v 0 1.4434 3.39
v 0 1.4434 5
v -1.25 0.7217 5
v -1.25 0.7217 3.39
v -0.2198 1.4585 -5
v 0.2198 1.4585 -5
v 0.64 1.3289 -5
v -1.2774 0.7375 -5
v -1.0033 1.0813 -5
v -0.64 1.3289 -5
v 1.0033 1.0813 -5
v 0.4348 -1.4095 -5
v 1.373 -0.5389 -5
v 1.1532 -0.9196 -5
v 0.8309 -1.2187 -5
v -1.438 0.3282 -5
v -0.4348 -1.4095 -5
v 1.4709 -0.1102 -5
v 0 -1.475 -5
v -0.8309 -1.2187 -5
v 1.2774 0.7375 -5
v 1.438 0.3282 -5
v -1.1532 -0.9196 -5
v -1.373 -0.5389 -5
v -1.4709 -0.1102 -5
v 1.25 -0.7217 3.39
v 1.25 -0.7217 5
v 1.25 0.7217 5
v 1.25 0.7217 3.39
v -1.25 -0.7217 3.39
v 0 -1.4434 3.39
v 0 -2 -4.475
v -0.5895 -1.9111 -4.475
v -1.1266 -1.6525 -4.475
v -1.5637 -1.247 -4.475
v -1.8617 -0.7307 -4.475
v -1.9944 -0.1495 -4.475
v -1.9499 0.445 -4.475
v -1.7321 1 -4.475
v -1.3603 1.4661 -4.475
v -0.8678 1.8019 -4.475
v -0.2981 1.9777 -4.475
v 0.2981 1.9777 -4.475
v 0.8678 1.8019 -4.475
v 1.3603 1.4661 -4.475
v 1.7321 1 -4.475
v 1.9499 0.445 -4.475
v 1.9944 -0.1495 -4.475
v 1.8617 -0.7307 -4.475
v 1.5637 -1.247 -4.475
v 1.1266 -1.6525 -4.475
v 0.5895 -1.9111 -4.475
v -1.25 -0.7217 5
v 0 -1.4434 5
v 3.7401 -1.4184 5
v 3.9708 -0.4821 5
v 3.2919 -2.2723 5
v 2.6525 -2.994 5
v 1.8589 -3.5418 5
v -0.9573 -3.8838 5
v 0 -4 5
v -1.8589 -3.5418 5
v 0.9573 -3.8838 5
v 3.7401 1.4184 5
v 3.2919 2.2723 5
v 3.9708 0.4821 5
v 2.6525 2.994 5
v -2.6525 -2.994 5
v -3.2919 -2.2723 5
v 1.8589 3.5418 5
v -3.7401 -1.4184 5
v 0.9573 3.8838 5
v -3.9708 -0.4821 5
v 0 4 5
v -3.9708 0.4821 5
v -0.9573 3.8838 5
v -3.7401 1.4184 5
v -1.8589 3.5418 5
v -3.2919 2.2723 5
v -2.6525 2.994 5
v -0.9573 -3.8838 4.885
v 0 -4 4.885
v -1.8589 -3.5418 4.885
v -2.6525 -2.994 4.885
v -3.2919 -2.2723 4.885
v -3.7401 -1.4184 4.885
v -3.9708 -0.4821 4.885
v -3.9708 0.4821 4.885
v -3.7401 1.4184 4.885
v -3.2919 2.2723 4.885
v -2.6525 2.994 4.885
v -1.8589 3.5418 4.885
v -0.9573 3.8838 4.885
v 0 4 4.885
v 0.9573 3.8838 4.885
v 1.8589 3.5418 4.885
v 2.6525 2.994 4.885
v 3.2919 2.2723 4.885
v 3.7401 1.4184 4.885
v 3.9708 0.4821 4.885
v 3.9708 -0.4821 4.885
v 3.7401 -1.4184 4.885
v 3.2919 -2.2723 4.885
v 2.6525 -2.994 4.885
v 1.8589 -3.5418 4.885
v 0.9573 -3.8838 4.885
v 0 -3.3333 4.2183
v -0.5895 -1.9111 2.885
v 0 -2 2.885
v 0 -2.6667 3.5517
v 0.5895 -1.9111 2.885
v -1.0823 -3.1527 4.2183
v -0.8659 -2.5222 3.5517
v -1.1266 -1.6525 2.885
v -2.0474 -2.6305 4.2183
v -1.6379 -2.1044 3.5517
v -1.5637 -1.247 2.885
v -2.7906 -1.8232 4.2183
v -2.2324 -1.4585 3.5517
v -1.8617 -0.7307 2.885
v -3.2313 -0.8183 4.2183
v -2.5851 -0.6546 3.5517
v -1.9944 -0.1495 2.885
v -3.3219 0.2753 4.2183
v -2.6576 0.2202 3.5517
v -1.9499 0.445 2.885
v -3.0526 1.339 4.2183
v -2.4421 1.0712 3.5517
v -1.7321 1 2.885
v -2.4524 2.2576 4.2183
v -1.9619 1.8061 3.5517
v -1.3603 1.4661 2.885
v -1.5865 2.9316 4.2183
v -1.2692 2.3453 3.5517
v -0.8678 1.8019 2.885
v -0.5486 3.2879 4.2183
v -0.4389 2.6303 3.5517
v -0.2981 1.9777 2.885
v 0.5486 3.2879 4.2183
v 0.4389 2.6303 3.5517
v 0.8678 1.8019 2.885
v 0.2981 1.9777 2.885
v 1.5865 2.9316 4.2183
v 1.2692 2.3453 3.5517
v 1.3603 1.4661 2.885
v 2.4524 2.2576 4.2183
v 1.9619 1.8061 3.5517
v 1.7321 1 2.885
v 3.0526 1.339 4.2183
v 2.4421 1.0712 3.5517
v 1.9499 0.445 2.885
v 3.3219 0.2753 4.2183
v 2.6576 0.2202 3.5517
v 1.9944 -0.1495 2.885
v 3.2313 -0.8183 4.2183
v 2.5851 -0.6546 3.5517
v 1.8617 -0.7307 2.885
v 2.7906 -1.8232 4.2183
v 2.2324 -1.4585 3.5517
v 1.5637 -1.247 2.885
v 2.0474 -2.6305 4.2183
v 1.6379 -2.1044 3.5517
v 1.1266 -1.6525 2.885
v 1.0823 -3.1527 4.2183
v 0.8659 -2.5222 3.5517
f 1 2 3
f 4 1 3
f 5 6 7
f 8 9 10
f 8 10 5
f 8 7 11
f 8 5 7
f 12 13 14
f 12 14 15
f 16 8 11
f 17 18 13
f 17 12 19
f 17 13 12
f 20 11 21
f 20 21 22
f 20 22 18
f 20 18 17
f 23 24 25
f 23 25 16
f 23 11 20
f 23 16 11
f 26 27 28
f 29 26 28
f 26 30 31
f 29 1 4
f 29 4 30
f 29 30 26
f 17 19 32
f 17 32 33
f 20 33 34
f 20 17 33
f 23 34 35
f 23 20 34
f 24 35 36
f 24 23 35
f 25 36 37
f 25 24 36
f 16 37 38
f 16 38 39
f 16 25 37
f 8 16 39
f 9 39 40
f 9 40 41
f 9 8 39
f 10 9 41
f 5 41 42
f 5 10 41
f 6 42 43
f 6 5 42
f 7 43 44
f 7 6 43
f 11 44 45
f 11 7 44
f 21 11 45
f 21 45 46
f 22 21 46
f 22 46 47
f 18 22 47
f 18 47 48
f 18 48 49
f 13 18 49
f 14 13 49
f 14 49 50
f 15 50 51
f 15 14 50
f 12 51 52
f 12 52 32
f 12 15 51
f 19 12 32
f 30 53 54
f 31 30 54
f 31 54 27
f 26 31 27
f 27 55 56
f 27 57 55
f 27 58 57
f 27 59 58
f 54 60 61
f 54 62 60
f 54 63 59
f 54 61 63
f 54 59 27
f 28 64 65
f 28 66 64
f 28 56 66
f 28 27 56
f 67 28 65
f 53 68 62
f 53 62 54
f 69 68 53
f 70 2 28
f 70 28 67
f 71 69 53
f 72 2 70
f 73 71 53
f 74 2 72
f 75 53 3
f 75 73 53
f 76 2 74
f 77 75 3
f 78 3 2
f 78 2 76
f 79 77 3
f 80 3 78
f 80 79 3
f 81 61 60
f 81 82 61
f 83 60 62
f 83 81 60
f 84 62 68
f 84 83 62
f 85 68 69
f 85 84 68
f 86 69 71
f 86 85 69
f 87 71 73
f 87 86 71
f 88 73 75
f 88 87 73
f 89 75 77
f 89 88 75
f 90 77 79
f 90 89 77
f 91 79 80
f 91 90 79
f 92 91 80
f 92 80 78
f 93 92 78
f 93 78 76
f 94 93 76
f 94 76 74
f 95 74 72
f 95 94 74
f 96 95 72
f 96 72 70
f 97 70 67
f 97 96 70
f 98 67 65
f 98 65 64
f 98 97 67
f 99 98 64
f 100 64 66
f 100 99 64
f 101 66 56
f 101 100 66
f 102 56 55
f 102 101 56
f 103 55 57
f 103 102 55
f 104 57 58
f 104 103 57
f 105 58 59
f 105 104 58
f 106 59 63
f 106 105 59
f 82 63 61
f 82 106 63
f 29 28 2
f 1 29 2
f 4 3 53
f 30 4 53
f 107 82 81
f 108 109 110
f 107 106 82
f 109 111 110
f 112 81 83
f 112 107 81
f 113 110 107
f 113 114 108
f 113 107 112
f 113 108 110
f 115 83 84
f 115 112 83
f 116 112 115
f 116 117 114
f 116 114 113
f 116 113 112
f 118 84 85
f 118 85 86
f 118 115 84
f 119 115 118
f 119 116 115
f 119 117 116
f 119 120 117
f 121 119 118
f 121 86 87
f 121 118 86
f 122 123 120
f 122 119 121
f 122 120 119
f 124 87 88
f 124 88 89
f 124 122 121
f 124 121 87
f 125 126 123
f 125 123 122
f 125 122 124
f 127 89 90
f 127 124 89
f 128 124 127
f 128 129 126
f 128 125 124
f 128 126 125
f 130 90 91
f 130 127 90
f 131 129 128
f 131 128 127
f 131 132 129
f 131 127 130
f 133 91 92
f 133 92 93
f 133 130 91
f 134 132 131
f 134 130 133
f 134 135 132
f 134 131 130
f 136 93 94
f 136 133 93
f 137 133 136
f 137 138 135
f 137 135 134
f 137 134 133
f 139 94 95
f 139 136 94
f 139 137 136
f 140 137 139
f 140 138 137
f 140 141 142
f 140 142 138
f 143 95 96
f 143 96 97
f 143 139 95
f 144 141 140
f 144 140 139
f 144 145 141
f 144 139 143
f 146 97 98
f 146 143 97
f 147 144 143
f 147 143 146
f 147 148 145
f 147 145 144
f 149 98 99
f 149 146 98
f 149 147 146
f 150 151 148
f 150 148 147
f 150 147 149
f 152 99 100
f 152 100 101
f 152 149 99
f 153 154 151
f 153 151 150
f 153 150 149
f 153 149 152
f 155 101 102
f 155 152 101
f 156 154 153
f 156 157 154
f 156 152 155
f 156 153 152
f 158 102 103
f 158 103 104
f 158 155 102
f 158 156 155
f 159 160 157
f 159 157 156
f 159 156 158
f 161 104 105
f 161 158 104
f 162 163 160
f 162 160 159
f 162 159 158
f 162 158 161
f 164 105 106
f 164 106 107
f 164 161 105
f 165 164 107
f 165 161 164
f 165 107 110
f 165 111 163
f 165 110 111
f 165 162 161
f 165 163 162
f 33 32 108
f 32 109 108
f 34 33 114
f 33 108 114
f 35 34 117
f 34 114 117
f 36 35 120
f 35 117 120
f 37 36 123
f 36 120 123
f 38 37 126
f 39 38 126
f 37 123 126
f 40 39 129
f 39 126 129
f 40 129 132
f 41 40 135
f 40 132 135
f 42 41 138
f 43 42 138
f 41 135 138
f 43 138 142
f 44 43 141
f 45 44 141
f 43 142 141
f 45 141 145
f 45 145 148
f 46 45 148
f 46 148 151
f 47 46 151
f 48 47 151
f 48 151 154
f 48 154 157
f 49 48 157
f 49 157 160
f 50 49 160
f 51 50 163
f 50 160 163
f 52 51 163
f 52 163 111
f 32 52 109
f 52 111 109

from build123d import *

# Parameters (mm, degrees)
CHAMFER1_SIZE      = 0.525
CUT_EXTRUDE2_DEPTH = 1.61


with BuildPart() as part:
    # Sketch1 → Revolve1 (revolve)
    with BuildSketch(Plane(origin=(0, 0, 0), x_dir=(0, 0, -1), z_dir=(1, 0, 0))):
        Polygon((-2.7, 2), (5, 2), (5, 0), (-3.39, 0), (-3.39, 2), align=None)
    revolve(axis=Axis((0, 0, 3.39), (0, 0, -1)))

    # Chamfer1
    chamfer1_edges = [part.edges().sort_by_distance(p)[0] for p in [
        (0, -2, -5),
    ]]
    chamfer(chamfer1_edges, length=CHAMFER1_SIZE)

    # Sketch7 → Revolve2 (revolve)
    with BuildSketch(Plane(origin=(0, 0, 0), x_dir=(0, 0, -1), z_dir=(1, 0, 0))):
        Polygon((-4.885, 4), (-5, 4), (-5, 0), (-2.7, 0), (-2.7, 1.815), align=None)
    revolve(axis=Axis((0, 0, 5), (0, 0, -1)))

    # Sketch5 → Cut-Extrude2 (cut)
    with BuildSketch(Plane.XY.offset(5)):
        Polygon((1.25, -0.721687836), (1.25, 0.721687836), (0, 1.443375673), (-1.25, 0.721687836), (-1.25, -0.721687836), (0, -1.443375673), align=None)
    extrude(amount=-CUT_EXTRUDE2_DEPTH, mode=Mode.SUBTRACT)


solid = part.part
